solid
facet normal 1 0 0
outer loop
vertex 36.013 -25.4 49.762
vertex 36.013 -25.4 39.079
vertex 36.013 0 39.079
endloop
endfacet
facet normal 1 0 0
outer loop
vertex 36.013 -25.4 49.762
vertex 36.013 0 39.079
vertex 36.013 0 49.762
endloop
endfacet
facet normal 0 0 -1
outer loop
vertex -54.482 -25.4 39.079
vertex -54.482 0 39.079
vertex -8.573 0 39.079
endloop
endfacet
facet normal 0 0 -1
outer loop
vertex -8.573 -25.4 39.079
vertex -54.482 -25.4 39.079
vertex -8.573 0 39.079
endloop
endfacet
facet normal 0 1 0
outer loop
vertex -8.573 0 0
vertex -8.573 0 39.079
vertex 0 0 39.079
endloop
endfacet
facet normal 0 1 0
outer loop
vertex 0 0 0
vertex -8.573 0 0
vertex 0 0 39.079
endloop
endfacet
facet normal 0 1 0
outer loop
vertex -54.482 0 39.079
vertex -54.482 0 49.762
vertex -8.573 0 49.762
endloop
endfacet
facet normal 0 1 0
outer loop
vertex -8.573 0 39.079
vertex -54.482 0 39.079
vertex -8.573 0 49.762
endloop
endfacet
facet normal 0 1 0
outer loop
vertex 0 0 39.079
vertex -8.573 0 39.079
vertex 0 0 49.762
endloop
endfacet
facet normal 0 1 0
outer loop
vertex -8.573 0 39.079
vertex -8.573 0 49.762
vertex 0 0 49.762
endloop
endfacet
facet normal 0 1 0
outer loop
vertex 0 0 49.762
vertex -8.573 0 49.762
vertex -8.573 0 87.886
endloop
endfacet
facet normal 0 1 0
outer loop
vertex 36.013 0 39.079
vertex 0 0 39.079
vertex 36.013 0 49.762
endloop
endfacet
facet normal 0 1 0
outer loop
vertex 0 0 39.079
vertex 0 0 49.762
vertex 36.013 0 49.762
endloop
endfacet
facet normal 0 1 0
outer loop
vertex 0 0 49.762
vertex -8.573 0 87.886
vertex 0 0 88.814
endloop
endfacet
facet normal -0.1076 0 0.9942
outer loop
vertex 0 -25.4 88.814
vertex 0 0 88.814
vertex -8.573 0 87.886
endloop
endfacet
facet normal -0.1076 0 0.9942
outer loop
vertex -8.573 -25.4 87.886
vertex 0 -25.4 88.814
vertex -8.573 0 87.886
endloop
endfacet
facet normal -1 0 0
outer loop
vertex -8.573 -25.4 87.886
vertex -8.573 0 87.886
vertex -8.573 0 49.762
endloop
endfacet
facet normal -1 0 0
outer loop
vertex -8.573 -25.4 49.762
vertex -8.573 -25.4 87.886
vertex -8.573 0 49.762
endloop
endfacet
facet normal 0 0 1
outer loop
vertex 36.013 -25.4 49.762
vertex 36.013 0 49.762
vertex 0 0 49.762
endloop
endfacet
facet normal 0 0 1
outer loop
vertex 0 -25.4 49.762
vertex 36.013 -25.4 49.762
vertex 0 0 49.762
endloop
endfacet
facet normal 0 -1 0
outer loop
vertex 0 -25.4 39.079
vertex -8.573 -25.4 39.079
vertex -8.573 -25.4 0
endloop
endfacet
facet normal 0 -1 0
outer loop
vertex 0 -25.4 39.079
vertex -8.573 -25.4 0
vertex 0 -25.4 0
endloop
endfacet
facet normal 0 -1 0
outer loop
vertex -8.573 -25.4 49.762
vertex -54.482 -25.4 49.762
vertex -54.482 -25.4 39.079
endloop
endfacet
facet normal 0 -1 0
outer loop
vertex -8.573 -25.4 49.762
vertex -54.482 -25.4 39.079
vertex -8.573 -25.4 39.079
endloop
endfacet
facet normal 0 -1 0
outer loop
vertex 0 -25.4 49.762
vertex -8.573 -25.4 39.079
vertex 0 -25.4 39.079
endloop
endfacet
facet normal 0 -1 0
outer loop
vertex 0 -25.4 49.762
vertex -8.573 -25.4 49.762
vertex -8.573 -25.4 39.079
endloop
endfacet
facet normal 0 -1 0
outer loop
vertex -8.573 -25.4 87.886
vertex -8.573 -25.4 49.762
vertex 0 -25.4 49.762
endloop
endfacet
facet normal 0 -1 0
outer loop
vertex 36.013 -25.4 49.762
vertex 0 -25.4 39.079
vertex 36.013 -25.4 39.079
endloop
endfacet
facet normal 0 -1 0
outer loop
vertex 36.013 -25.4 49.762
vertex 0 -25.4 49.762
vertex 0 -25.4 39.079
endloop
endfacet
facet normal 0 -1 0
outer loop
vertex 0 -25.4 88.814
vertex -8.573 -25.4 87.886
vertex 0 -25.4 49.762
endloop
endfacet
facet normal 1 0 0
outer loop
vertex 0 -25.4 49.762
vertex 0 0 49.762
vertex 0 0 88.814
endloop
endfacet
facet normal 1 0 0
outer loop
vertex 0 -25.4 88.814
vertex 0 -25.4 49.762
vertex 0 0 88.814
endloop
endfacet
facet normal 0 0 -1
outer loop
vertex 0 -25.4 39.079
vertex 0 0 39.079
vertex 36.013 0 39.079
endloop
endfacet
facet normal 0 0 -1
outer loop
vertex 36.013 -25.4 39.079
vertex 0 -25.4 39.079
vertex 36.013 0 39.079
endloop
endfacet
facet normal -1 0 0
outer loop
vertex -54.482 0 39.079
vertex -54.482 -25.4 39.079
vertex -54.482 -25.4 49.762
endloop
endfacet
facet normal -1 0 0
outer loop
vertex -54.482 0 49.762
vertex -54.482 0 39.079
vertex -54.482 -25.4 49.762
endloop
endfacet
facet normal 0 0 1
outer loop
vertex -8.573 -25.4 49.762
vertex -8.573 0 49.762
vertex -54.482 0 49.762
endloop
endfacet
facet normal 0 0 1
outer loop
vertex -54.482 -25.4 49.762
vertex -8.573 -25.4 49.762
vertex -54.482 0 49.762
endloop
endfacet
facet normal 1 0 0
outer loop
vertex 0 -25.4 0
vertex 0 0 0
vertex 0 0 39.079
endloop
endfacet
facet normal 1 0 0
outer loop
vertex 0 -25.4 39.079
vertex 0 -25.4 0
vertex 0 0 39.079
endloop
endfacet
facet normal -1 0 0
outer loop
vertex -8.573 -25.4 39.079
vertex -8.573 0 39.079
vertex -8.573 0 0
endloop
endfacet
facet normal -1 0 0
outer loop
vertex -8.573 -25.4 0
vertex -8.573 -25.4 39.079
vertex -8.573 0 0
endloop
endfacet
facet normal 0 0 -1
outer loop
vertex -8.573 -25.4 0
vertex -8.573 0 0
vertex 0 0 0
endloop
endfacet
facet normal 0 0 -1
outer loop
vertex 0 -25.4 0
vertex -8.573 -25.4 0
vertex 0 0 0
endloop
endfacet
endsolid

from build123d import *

# Parameters (mm, degrees)
F0_W     = 45.9087826312
F0_H     = 10.6835663319
F0_W_2   = 8.5728019476
F0_W_3   = 36.0127463937
F1_DEPTH = 25.4
F0_H_2   = 39.0786156058
F2_DEPTH = 25.4


# Not quite as in the source:
# - a feature names something its author has since deleted; it is built from what else it names


with BuildPart() as f1:
    # F0 (on Front) → F1 (new body)
    with BuildSketch(Plane.XZ):
        with Locations((-31.5271932632, 44.4203987718)):
            Rectangle(F0_W, F0_H)
        with Locations((-4.2864009738, 44.4203987718)):
            Rectangle(F0_W_2, F0_H)
        with Locations((18.0063731968, 44.4203987718)):
            Rectangle(F0_W_3, F0_H)
    extrude(amount=F1_DEPTH)

    # F0 (on Front) → F2 (join)
    with BuildSketch(Plane.XZ):
        with Locations((-4.2864009738, 19.5393078029)):
            Rectangle(F0_W_2, F0_H_2)
        with Locations((-4.2864009738, 44.4203987718)):
            Rectangle(F0_W_2, F0_H)
        Polygon((-8.5728019476, 87.886022841), (-8.5728019476, 49.7621819377), (0, 49.7621819377), (0, 88.8135335598), align=None)
    extrude(amount=F2_DEPTH)


solid = f1.part
